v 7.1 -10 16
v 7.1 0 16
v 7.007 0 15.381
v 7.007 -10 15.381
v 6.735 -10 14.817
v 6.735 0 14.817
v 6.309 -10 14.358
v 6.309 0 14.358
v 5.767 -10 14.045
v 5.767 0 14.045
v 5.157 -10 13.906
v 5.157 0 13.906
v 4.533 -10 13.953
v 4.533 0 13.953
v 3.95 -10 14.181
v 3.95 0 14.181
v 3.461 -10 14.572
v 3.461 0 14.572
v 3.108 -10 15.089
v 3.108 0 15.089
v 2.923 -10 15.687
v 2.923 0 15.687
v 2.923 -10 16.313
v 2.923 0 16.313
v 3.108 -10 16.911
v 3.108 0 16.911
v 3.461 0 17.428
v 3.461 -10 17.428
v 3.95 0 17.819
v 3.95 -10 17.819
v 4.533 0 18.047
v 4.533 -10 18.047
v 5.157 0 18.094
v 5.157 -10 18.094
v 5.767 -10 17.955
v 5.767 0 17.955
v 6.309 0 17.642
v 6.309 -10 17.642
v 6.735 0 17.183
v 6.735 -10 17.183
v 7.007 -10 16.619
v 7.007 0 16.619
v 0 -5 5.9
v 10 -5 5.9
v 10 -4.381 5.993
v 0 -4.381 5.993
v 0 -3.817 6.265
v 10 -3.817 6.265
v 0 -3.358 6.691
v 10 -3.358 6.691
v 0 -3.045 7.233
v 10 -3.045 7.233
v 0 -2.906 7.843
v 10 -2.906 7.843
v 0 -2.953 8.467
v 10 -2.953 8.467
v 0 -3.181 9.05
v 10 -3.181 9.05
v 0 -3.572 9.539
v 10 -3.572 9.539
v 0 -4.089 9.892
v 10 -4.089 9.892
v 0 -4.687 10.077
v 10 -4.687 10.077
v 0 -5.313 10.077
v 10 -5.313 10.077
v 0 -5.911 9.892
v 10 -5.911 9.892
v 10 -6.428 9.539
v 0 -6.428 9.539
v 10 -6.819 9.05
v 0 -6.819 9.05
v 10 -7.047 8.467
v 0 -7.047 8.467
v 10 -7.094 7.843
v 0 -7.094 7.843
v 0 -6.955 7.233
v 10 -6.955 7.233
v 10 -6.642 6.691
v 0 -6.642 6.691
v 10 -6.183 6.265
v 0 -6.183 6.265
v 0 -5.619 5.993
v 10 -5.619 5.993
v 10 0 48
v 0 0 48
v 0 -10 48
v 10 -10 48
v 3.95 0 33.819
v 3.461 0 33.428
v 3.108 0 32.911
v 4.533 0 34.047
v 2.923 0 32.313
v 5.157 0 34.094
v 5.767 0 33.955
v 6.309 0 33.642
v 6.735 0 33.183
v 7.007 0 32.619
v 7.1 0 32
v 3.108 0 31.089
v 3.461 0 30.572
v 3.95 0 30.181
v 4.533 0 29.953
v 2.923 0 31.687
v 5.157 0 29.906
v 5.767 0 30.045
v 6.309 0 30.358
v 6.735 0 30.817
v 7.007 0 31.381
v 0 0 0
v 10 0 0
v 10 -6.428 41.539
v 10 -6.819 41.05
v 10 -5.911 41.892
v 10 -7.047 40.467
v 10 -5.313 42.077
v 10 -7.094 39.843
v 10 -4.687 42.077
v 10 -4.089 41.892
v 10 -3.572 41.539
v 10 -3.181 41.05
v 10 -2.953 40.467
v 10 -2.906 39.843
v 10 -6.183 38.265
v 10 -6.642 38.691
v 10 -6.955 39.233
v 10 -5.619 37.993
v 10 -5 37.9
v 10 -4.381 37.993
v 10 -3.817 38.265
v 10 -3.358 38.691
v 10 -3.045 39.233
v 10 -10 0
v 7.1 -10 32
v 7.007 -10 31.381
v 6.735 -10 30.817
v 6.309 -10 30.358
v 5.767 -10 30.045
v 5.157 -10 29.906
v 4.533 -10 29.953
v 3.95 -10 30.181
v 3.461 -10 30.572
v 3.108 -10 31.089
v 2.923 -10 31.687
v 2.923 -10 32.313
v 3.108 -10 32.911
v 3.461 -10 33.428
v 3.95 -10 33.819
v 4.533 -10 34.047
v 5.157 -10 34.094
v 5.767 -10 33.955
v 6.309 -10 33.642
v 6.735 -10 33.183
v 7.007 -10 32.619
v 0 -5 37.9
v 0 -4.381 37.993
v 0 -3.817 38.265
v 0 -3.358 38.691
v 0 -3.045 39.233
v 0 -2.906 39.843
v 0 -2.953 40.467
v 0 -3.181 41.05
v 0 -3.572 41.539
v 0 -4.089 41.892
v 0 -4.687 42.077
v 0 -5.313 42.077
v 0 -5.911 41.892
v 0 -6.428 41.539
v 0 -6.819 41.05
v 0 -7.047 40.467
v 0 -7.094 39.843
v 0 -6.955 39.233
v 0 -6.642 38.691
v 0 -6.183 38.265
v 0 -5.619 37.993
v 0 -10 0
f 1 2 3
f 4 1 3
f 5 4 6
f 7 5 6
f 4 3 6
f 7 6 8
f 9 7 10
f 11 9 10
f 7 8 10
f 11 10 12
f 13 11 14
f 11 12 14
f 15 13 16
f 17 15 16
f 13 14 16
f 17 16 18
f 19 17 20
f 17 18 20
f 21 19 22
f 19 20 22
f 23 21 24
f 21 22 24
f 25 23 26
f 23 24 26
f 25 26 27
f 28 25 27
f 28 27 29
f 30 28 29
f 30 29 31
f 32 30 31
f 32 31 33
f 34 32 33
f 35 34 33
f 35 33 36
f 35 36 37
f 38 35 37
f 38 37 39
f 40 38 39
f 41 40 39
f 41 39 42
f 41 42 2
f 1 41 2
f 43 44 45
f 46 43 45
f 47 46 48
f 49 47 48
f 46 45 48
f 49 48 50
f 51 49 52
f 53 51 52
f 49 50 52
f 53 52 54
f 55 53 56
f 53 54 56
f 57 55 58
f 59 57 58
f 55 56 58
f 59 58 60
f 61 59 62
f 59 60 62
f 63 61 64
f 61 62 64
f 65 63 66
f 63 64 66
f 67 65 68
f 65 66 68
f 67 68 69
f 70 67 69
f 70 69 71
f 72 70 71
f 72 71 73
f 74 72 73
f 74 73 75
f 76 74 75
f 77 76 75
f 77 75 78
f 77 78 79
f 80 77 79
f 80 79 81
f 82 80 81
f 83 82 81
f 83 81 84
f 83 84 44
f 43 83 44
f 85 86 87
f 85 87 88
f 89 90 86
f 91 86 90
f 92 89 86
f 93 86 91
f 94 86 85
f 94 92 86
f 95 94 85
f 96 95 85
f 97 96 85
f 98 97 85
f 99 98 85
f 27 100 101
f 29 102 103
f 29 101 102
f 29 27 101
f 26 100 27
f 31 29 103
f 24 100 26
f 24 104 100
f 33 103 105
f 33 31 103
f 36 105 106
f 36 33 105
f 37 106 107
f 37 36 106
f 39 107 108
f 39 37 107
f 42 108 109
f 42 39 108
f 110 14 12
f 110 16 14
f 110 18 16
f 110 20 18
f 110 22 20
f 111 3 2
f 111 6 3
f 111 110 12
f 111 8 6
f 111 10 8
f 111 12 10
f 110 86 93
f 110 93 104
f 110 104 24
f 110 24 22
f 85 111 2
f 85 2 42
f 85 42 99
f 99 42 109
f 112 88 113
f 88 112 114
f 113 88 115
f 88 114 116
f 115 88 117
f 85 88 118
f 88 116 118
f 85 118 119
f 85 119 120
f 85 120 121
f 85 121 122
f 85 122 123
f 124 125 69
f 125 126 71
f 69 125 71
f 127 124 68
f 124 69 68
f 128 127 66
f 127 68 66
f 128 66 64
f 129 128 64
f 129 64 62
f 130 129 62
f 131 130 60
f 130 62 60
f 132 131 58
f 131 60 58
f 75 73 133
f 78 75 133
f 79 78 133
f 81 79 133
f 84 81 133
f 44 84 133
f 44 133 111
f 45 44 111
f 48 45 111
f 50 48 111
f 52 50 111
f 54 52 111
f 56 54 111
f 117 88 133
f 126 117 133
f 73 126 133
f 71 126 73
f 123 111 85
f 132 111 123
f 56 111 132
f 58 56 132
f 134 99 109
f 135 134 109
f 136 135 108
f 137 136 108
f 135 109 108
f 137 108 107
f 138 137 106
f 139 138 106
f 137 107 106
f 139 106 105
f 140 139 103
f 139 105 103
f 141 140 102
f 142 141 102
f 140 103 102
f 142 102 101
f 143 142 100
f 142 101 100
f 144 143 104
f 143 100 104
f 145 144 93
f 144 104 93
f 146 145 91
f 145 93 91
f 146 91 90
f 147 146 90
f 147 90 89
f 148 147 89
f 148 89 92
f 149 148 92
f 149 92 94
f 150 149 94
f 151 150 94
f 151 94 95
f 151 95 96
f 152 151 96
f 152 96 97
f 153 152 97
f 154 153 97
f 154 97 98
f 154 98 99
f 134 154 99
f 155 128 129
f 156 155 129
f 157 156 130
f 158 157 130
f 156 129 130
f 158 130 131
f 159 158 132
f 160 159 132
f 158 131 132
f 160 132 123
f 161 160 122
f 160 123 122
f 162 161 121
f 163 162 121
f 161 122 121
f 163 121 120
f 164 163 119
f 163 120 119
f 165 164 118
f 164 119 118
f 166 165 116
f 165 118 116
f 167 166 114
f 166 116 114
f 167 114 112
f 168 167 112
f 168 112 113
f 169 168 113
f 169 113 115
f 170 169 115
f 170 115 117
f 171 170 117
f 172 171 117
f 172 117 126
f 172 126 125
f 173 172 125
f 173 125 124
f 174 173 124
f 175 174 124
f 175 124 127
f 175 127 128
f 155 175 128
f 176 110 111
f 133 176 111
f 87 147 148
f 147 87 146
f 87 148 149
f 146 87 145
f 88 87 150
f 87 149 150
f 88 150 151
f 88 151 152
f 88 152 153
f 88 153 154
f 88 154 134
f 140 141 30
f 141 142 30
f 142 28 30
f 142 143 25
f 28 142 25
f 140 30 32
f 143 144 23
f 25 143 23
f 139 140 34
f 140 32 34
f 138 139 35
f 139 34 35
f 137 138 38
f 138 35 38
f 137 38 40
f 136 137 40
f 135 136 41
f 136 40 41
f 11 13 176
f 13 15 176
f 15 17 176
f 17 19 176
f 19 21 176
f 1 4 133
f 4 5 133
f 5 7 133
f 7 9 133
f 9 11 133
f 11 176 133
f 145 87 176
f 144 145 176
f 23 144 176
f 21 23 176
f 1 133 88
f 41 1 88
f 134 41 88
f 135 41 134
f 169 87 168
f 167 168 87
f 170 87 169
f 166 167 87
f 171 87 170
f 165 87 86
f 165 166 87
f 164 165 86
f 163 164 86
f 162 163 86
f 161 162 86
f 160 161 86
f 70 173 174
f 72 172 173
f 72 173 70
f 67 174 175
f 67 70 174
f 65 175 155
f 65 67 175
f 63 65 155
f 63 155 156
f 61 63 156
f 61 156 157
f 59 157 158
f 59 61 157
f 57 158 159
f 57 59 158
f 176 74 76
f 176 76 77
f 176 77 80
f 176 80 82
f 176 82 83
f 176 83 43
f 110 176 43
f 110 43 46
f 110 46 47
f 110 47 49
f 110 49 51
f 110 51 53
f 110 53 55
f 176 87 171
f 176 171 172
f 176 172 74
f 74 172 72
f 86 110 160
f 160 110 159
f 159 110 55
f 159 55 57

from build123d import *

# Parameters (mm, degrees)
SKETCH_1_W          = 10
SKETCH_1_H          = 10
EXTRUDE_1_DEPTH     = 48
SKETCH_2_R          = 2.1
CUT_EXTRUDE_1_DEPTH = 48
SKETCH_3_R          = 2.1
CUT_EXTRUDE_2_DEPTH = 48


with BuildPart() as part:
    # 草图1 → 凸台-拉伸1 (new body)
    with BuildSketch(Plane.XY):
        with Locations((5, -5)):
            Rectangle(SKETCH_1_W, SKETCH_1_H)
    extrude(amount=EXTRUDE_1_DEPTH)

    # 草图2 → 切除-拉伸1 (cut)
    with BuildSketch(Plane(origin=(10, 0, 0), x_dir=(0, 0, -1), z_dir=(1, 0, 0))):
        with Locations((-40, -5)):
            Circle(SKETCH_2_R)
        with Locations((-8, -5)):
            Circle(SKETCH_2_R)
    extrude(amount=-CUT_EXTRUDE_1_DEPTH, mode=Mode.SUBTRACT)

    # 草图3 → 切除-拉伸2 (cut)
    with BuildSketch(Plane(origin=(0, 0, 0), x_dir=(1, 0, 0), z_dir=(0, 1, 0))):
        with Locations((5, -16)):
            Circle(SKETCH_3_R)
        with Locations((5, -32)):
            Circle(SKETCH_3_R)
    extrude(amount=-CUT_EXTRUDE_2_DEPTH, mode=Mode.SUBTRACT)


solid = part.part
